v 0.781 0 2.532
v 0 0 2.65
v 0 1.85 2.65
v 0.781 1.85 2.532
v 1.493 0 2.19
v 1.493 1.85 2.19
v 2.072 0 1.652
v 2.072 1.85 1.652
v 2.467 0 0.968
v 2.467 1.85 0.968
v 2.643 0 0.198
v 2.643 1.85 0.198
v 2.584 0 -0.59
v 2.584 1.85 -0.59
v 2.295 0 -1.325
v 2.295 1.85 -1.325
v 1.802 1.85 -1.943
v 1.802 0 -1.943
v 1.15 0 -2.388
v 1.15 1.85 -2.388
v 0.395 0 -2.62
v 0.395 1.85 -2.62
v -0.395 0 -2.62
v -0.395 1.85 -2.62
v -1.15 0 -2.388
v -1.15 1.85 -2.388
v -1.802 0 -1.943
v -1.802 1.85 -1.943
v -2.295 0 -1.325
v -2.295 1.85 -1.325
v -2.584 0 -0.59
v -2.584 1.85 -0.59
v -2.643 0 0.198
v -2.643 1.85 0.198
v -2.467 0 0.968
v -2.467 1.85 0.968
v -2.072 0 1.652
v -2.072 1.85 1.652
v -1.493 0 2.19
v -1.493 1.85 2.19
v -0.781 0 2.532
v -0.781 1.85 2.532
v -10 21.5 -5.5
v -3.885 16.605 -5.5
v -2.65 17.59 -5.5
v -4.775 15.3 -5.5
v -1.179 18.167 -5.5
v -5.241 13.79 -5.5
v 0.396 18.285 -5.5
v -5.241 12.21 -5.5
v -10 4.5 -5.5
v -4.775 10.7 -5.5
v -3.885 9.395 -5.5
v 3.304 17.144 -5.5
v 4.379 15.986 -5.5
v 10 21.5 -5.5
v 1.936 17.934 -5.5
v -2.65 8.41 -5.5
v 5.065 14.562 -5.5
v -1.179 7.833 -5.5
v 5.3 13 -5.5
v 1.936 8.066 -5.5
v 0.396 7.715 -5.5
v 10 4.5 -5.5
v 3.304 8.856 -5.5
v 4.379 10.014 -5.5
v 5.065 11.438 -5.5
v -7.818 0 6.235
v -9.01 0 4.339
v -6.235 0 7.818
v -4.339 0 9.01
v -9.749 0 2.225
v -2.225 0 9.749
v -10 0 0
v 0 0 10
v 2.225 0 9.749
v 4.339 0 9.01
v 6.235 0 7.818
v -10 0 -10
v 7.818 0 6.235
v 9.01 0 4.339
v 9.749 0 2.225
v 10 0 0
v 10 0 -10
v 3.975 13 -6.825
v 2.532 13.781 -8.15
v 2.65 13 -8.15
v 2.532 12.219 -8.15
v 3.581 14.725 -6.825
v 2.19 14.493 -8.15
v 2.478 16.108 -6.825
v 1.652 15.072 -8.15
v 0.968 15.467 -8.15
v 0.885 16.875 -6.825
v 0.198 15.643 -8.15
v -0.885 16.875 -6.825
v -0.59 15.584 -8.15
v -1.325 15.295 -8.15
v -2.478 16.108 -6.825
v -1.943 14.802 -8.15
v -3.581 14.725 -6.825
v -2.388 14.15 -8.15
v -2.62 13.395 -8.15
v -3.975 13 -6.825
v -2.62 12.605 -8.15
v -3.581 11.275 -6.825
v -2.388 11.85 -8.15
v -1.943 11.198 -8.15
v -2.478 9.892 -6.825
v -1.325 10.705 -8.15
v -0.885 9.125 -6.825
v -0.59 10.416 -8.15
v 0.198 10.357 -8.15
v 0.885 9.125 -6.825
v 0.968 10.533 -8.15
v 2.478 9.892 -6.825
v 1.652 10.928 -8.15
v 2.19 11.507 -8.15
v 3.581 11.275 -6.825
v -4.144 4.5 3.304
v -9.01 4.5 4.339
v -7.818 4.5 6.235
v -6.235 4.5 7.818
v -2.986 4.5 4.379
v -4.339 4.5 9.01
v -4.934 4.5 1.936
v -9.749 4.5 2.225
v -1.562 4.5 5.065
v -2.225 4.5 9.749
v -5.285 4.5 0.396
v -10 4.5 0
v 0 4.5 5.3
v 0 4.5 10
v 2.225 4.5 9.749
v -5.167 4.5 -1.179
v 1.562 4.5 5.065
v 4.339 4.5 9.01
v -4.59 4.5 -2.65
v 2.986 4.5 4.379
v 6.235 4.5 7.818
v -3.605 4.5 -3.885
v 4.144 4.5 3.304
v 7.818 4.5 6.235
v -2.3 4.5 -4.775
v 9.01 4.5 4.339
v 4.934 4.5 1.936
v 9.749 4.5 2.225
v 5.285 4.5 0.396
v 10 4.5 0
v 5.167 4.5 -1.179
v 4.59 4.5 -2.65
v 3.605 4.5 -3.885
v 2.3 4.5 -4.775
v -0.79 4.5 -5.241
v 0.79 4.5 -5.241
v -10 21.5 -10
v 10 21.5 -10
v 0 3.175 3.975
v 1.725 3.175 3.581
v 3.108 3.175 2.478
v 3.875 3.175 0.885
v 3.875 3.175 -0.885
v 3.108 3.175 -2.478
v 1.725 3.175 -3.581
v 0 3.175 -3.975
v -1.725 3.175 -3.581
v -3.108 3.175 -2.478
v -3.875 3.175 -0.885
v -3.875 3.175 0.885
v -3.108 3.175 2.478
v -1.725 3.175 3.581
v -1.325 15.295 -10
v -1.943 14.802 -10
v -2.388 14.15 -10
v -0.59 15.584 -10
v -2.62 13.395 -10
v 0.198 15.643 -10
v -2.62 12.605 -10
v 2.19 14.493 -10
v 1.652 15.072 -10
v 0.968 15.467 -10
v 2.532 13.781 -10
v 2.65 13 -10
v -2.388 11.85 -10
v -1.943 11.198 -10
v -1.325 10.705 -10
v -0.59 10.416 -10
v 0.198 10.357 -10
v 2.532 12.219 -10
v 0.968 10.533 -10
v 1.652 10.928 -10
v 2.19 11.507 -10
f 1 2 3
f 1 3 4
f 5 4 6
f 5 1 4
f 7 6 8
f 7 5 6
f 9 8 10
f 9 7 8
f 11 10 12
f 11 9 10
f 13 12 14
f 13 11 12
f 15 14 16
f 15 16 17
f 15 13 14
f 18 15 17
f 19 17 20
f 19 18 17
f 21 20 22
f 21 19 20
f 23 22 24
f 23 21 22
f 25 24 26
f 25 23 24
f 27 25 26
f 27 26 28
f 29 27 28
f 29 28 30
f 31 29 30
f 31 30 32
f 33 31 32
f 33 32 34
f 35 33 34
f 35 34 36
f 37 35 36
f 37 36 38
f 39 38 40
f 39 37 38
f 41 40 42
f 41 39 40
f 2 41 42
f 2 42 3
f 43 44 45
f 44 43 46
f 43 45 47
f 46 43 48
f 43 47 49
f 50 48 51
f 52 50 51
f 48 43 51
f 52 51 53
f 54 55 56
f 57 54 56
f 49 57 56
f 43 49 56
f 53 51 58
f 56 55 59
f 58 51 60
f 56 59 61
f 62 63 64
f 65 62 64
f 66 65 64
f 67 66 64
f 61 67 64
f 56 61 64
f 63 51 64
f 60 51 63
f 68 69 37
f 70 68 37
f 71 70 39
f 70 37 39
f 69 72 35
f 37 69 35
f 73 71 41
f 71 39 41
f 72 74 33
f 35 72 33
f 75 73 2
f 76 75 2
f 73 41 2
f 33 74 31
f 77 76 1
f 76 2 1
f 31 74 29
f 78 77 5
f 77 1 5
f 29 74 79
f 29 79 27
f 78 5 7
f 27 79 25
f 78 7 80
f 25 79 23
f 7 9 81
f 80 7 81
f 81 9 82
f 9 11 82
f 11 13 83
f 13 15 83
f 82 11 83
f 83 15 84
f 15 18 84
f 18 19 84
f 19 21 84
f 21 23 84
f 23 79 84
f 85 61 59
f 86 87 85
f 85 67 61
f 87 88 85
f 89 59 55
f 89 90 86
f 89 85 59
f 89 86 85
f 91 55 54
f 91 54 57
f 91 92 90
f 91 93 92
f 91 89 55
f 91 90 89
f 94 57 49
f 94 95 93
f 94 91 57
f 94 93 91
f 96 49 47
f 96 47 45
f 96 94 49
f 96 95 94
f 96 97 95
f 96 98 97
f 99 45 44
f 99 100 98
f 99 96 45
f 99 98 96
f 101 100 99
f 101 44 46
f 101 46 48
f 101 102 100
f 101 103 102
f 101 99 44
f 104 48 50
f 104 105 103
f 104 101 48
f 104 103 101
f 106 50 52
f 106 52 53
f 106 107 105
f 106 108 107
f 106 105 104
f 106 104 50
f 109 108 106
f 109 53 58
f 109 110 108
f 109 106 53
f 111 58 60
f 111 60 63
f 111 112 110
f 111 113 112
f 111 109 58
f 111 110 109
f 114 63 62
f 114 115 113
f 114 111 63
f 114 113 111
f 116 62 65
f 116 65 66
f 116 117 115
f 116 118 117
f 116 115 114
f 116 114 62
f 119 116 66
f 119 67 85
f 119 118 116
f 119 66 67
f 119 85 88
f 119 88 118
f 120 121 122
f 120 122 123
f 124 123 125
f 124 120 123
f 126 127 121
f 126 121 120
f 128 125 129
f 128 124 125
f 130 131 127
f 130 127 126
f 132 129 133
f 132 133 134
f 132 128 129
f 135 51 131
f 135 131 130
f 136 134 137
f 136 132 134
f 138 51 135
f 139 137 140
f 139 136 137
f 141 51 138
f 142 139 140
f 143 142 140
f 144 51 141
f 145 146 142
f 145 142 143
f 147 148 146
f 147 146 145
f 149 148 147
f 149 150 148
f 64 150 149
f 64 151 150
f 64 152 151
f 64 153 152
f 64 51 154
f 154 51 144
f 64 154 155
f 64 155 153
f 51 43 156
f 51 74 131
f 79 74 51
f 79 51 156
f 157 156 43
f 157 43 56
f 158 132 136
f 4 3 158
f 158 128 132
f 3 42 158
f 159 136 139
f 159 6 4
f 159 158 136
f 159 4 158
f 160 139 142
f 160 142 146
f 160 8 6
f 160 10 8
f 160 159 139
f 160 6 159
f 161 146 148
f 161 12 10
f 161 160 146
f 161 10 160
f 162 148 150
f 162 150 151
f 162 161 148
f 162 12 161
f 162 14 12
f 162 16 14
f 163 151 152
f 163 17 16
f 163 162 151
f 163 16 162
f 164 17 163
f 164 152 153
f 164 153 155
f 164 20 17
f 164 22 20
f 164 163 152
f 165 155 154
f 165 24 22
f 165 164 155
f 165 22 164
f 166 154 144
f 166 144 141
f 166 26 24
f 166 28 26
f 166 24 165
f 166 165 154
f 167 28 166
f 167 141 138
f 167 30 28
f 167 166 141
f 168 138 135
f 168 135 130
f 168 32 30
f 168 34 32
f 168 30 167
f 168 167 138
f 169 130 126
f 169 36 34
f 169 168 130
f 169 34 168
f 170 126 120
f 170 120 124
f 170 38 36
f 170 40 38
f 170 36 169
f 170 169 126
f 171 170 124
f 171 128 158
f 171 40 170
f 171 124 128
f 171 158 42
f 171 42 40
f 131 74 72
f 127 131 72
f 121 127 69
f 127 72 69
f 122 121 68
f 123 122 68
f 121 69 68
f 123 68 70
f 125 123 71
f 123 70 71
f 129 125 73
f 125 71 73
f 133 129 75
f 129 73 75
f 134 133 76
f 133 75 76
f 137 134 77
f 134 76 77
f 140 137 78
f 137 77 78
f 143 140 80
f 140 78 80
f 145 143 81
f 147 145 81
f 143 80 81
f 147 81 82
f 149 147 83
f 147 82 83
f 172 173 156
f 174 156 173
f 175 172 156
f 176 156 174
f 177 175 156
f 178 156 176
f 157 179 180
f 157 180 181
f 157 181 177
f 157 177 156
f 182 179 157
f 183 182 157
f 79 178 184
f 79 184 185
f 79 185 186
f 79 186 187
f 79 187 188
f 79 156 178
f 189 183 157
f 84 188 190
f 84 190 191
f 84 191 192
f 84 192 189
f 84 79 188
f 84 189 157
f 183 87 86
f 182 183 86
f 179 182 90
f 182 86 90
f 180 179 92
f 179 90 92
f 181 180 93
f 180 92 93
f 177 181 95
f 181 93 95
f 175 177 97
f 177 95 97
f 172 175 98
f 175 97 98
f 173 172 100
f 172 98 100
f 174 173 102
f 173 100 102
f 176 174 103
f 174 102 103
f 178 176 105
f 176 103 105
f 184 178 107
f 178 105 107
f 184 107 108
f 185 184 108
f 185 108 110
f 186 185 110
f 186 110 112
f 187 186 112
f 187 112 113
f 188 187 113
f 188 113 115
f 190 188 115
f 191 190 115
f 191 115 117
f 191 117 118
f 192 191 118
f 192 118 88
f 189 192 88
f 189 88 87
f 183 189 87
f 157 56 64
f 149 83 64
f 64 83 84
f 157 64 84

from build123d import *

# Parameters (mm, degrees)
SKETCH_1_R          = 10
SKETCH_1_R_2        = 2.65
EXTRUDE_1_DEPTH     = 4.5
SKETCH_2_W          = 20
SKETCH_2_H          = 4.5
EXTRUDE_2_DEPTH     = 17
SKETCH_3_R          = 2.65
CUT_EXTRUDE_1_DEPTH = 17
CHAMFER_1_SIZE      = 2.65


with BuildPart() as part:
    # 草图1 → 凸台-拉伸1 (new body)
    # profile 1 of 3: a face of its own
    with BuildSketch(Plane(origin=(0, 0, 0), x_dir=(1, 0, 0), z_dir=(0, 1, 0))):
        with BuildLine():
            Line((0, 10), (-10, 10))
            Line((-10, 10), (-10, 0))
            ThreePointArc((-10, 0), (-7.071067812, 7.071067812), (0, 10))
        make_face()
    # profile 2 of 3: a face of its own
    with BuildSketch(Plane(origin=(0, 0, 0), x_dir=(1, 0, 0), z_dir=(0, 1, 0))):
        with BuildLine():
            Line((10, 10), (0, 10))
            ThreePointArc((0, 10), (7.071067812, 7.071067812), (10, 0))
            Line((10, 0), (10, 10))
        make_face()
    # profile 3 of 3: a face of its own
    with BuildSketch(Plane(origin=(0, 0, 0), x_dir=(1, 0, 0), z_dir=(0, 1, 0))):
        Circle(SKETCH_1_R)
        with Locations(Location((0, 0, 0), (0, 0, 270))):
            Circle(SKETCH_1_R_2, mode=Mode.SUBTRACT)
    extrude(amount=EXTRUDE_1_DEPTH)

    # 草图2 → 凸台-拉伸2 (add)
    with BuildSketch(Plane(origin=(0, 4.5, 0), x_dir=(1, 0, 0), z_dir=(0, 1, 0))):
        with Locations((0, 7.75)):
            Rectangle(SKETCH_2_W, SKETCH_2_H)
    extrude(amount=EXTRUDE_2_DEPTH)

    # 草图3 → 切除-拉伸1 (cut)
    with BuildSketch(Plane.XY.offset(-5.5)):
        with Locations((0, 13)):
            Circle(SKETCH_3_R)
    extrude(amount=-CUT_EXTRUDE_1_DEPTH, mode=Mode.SUBTRACT)

    # 倒角1
    chamfer_1_edges = [part.edges().sort_by_distance(p)[0] for p in [
        (0, 4.5, -2.65),
        (-2.65, 13, -5.5),
    ]]
    chamfer(chamfer_1_edges, length=CHAMFER_1_SIZE)


solid = part.part
